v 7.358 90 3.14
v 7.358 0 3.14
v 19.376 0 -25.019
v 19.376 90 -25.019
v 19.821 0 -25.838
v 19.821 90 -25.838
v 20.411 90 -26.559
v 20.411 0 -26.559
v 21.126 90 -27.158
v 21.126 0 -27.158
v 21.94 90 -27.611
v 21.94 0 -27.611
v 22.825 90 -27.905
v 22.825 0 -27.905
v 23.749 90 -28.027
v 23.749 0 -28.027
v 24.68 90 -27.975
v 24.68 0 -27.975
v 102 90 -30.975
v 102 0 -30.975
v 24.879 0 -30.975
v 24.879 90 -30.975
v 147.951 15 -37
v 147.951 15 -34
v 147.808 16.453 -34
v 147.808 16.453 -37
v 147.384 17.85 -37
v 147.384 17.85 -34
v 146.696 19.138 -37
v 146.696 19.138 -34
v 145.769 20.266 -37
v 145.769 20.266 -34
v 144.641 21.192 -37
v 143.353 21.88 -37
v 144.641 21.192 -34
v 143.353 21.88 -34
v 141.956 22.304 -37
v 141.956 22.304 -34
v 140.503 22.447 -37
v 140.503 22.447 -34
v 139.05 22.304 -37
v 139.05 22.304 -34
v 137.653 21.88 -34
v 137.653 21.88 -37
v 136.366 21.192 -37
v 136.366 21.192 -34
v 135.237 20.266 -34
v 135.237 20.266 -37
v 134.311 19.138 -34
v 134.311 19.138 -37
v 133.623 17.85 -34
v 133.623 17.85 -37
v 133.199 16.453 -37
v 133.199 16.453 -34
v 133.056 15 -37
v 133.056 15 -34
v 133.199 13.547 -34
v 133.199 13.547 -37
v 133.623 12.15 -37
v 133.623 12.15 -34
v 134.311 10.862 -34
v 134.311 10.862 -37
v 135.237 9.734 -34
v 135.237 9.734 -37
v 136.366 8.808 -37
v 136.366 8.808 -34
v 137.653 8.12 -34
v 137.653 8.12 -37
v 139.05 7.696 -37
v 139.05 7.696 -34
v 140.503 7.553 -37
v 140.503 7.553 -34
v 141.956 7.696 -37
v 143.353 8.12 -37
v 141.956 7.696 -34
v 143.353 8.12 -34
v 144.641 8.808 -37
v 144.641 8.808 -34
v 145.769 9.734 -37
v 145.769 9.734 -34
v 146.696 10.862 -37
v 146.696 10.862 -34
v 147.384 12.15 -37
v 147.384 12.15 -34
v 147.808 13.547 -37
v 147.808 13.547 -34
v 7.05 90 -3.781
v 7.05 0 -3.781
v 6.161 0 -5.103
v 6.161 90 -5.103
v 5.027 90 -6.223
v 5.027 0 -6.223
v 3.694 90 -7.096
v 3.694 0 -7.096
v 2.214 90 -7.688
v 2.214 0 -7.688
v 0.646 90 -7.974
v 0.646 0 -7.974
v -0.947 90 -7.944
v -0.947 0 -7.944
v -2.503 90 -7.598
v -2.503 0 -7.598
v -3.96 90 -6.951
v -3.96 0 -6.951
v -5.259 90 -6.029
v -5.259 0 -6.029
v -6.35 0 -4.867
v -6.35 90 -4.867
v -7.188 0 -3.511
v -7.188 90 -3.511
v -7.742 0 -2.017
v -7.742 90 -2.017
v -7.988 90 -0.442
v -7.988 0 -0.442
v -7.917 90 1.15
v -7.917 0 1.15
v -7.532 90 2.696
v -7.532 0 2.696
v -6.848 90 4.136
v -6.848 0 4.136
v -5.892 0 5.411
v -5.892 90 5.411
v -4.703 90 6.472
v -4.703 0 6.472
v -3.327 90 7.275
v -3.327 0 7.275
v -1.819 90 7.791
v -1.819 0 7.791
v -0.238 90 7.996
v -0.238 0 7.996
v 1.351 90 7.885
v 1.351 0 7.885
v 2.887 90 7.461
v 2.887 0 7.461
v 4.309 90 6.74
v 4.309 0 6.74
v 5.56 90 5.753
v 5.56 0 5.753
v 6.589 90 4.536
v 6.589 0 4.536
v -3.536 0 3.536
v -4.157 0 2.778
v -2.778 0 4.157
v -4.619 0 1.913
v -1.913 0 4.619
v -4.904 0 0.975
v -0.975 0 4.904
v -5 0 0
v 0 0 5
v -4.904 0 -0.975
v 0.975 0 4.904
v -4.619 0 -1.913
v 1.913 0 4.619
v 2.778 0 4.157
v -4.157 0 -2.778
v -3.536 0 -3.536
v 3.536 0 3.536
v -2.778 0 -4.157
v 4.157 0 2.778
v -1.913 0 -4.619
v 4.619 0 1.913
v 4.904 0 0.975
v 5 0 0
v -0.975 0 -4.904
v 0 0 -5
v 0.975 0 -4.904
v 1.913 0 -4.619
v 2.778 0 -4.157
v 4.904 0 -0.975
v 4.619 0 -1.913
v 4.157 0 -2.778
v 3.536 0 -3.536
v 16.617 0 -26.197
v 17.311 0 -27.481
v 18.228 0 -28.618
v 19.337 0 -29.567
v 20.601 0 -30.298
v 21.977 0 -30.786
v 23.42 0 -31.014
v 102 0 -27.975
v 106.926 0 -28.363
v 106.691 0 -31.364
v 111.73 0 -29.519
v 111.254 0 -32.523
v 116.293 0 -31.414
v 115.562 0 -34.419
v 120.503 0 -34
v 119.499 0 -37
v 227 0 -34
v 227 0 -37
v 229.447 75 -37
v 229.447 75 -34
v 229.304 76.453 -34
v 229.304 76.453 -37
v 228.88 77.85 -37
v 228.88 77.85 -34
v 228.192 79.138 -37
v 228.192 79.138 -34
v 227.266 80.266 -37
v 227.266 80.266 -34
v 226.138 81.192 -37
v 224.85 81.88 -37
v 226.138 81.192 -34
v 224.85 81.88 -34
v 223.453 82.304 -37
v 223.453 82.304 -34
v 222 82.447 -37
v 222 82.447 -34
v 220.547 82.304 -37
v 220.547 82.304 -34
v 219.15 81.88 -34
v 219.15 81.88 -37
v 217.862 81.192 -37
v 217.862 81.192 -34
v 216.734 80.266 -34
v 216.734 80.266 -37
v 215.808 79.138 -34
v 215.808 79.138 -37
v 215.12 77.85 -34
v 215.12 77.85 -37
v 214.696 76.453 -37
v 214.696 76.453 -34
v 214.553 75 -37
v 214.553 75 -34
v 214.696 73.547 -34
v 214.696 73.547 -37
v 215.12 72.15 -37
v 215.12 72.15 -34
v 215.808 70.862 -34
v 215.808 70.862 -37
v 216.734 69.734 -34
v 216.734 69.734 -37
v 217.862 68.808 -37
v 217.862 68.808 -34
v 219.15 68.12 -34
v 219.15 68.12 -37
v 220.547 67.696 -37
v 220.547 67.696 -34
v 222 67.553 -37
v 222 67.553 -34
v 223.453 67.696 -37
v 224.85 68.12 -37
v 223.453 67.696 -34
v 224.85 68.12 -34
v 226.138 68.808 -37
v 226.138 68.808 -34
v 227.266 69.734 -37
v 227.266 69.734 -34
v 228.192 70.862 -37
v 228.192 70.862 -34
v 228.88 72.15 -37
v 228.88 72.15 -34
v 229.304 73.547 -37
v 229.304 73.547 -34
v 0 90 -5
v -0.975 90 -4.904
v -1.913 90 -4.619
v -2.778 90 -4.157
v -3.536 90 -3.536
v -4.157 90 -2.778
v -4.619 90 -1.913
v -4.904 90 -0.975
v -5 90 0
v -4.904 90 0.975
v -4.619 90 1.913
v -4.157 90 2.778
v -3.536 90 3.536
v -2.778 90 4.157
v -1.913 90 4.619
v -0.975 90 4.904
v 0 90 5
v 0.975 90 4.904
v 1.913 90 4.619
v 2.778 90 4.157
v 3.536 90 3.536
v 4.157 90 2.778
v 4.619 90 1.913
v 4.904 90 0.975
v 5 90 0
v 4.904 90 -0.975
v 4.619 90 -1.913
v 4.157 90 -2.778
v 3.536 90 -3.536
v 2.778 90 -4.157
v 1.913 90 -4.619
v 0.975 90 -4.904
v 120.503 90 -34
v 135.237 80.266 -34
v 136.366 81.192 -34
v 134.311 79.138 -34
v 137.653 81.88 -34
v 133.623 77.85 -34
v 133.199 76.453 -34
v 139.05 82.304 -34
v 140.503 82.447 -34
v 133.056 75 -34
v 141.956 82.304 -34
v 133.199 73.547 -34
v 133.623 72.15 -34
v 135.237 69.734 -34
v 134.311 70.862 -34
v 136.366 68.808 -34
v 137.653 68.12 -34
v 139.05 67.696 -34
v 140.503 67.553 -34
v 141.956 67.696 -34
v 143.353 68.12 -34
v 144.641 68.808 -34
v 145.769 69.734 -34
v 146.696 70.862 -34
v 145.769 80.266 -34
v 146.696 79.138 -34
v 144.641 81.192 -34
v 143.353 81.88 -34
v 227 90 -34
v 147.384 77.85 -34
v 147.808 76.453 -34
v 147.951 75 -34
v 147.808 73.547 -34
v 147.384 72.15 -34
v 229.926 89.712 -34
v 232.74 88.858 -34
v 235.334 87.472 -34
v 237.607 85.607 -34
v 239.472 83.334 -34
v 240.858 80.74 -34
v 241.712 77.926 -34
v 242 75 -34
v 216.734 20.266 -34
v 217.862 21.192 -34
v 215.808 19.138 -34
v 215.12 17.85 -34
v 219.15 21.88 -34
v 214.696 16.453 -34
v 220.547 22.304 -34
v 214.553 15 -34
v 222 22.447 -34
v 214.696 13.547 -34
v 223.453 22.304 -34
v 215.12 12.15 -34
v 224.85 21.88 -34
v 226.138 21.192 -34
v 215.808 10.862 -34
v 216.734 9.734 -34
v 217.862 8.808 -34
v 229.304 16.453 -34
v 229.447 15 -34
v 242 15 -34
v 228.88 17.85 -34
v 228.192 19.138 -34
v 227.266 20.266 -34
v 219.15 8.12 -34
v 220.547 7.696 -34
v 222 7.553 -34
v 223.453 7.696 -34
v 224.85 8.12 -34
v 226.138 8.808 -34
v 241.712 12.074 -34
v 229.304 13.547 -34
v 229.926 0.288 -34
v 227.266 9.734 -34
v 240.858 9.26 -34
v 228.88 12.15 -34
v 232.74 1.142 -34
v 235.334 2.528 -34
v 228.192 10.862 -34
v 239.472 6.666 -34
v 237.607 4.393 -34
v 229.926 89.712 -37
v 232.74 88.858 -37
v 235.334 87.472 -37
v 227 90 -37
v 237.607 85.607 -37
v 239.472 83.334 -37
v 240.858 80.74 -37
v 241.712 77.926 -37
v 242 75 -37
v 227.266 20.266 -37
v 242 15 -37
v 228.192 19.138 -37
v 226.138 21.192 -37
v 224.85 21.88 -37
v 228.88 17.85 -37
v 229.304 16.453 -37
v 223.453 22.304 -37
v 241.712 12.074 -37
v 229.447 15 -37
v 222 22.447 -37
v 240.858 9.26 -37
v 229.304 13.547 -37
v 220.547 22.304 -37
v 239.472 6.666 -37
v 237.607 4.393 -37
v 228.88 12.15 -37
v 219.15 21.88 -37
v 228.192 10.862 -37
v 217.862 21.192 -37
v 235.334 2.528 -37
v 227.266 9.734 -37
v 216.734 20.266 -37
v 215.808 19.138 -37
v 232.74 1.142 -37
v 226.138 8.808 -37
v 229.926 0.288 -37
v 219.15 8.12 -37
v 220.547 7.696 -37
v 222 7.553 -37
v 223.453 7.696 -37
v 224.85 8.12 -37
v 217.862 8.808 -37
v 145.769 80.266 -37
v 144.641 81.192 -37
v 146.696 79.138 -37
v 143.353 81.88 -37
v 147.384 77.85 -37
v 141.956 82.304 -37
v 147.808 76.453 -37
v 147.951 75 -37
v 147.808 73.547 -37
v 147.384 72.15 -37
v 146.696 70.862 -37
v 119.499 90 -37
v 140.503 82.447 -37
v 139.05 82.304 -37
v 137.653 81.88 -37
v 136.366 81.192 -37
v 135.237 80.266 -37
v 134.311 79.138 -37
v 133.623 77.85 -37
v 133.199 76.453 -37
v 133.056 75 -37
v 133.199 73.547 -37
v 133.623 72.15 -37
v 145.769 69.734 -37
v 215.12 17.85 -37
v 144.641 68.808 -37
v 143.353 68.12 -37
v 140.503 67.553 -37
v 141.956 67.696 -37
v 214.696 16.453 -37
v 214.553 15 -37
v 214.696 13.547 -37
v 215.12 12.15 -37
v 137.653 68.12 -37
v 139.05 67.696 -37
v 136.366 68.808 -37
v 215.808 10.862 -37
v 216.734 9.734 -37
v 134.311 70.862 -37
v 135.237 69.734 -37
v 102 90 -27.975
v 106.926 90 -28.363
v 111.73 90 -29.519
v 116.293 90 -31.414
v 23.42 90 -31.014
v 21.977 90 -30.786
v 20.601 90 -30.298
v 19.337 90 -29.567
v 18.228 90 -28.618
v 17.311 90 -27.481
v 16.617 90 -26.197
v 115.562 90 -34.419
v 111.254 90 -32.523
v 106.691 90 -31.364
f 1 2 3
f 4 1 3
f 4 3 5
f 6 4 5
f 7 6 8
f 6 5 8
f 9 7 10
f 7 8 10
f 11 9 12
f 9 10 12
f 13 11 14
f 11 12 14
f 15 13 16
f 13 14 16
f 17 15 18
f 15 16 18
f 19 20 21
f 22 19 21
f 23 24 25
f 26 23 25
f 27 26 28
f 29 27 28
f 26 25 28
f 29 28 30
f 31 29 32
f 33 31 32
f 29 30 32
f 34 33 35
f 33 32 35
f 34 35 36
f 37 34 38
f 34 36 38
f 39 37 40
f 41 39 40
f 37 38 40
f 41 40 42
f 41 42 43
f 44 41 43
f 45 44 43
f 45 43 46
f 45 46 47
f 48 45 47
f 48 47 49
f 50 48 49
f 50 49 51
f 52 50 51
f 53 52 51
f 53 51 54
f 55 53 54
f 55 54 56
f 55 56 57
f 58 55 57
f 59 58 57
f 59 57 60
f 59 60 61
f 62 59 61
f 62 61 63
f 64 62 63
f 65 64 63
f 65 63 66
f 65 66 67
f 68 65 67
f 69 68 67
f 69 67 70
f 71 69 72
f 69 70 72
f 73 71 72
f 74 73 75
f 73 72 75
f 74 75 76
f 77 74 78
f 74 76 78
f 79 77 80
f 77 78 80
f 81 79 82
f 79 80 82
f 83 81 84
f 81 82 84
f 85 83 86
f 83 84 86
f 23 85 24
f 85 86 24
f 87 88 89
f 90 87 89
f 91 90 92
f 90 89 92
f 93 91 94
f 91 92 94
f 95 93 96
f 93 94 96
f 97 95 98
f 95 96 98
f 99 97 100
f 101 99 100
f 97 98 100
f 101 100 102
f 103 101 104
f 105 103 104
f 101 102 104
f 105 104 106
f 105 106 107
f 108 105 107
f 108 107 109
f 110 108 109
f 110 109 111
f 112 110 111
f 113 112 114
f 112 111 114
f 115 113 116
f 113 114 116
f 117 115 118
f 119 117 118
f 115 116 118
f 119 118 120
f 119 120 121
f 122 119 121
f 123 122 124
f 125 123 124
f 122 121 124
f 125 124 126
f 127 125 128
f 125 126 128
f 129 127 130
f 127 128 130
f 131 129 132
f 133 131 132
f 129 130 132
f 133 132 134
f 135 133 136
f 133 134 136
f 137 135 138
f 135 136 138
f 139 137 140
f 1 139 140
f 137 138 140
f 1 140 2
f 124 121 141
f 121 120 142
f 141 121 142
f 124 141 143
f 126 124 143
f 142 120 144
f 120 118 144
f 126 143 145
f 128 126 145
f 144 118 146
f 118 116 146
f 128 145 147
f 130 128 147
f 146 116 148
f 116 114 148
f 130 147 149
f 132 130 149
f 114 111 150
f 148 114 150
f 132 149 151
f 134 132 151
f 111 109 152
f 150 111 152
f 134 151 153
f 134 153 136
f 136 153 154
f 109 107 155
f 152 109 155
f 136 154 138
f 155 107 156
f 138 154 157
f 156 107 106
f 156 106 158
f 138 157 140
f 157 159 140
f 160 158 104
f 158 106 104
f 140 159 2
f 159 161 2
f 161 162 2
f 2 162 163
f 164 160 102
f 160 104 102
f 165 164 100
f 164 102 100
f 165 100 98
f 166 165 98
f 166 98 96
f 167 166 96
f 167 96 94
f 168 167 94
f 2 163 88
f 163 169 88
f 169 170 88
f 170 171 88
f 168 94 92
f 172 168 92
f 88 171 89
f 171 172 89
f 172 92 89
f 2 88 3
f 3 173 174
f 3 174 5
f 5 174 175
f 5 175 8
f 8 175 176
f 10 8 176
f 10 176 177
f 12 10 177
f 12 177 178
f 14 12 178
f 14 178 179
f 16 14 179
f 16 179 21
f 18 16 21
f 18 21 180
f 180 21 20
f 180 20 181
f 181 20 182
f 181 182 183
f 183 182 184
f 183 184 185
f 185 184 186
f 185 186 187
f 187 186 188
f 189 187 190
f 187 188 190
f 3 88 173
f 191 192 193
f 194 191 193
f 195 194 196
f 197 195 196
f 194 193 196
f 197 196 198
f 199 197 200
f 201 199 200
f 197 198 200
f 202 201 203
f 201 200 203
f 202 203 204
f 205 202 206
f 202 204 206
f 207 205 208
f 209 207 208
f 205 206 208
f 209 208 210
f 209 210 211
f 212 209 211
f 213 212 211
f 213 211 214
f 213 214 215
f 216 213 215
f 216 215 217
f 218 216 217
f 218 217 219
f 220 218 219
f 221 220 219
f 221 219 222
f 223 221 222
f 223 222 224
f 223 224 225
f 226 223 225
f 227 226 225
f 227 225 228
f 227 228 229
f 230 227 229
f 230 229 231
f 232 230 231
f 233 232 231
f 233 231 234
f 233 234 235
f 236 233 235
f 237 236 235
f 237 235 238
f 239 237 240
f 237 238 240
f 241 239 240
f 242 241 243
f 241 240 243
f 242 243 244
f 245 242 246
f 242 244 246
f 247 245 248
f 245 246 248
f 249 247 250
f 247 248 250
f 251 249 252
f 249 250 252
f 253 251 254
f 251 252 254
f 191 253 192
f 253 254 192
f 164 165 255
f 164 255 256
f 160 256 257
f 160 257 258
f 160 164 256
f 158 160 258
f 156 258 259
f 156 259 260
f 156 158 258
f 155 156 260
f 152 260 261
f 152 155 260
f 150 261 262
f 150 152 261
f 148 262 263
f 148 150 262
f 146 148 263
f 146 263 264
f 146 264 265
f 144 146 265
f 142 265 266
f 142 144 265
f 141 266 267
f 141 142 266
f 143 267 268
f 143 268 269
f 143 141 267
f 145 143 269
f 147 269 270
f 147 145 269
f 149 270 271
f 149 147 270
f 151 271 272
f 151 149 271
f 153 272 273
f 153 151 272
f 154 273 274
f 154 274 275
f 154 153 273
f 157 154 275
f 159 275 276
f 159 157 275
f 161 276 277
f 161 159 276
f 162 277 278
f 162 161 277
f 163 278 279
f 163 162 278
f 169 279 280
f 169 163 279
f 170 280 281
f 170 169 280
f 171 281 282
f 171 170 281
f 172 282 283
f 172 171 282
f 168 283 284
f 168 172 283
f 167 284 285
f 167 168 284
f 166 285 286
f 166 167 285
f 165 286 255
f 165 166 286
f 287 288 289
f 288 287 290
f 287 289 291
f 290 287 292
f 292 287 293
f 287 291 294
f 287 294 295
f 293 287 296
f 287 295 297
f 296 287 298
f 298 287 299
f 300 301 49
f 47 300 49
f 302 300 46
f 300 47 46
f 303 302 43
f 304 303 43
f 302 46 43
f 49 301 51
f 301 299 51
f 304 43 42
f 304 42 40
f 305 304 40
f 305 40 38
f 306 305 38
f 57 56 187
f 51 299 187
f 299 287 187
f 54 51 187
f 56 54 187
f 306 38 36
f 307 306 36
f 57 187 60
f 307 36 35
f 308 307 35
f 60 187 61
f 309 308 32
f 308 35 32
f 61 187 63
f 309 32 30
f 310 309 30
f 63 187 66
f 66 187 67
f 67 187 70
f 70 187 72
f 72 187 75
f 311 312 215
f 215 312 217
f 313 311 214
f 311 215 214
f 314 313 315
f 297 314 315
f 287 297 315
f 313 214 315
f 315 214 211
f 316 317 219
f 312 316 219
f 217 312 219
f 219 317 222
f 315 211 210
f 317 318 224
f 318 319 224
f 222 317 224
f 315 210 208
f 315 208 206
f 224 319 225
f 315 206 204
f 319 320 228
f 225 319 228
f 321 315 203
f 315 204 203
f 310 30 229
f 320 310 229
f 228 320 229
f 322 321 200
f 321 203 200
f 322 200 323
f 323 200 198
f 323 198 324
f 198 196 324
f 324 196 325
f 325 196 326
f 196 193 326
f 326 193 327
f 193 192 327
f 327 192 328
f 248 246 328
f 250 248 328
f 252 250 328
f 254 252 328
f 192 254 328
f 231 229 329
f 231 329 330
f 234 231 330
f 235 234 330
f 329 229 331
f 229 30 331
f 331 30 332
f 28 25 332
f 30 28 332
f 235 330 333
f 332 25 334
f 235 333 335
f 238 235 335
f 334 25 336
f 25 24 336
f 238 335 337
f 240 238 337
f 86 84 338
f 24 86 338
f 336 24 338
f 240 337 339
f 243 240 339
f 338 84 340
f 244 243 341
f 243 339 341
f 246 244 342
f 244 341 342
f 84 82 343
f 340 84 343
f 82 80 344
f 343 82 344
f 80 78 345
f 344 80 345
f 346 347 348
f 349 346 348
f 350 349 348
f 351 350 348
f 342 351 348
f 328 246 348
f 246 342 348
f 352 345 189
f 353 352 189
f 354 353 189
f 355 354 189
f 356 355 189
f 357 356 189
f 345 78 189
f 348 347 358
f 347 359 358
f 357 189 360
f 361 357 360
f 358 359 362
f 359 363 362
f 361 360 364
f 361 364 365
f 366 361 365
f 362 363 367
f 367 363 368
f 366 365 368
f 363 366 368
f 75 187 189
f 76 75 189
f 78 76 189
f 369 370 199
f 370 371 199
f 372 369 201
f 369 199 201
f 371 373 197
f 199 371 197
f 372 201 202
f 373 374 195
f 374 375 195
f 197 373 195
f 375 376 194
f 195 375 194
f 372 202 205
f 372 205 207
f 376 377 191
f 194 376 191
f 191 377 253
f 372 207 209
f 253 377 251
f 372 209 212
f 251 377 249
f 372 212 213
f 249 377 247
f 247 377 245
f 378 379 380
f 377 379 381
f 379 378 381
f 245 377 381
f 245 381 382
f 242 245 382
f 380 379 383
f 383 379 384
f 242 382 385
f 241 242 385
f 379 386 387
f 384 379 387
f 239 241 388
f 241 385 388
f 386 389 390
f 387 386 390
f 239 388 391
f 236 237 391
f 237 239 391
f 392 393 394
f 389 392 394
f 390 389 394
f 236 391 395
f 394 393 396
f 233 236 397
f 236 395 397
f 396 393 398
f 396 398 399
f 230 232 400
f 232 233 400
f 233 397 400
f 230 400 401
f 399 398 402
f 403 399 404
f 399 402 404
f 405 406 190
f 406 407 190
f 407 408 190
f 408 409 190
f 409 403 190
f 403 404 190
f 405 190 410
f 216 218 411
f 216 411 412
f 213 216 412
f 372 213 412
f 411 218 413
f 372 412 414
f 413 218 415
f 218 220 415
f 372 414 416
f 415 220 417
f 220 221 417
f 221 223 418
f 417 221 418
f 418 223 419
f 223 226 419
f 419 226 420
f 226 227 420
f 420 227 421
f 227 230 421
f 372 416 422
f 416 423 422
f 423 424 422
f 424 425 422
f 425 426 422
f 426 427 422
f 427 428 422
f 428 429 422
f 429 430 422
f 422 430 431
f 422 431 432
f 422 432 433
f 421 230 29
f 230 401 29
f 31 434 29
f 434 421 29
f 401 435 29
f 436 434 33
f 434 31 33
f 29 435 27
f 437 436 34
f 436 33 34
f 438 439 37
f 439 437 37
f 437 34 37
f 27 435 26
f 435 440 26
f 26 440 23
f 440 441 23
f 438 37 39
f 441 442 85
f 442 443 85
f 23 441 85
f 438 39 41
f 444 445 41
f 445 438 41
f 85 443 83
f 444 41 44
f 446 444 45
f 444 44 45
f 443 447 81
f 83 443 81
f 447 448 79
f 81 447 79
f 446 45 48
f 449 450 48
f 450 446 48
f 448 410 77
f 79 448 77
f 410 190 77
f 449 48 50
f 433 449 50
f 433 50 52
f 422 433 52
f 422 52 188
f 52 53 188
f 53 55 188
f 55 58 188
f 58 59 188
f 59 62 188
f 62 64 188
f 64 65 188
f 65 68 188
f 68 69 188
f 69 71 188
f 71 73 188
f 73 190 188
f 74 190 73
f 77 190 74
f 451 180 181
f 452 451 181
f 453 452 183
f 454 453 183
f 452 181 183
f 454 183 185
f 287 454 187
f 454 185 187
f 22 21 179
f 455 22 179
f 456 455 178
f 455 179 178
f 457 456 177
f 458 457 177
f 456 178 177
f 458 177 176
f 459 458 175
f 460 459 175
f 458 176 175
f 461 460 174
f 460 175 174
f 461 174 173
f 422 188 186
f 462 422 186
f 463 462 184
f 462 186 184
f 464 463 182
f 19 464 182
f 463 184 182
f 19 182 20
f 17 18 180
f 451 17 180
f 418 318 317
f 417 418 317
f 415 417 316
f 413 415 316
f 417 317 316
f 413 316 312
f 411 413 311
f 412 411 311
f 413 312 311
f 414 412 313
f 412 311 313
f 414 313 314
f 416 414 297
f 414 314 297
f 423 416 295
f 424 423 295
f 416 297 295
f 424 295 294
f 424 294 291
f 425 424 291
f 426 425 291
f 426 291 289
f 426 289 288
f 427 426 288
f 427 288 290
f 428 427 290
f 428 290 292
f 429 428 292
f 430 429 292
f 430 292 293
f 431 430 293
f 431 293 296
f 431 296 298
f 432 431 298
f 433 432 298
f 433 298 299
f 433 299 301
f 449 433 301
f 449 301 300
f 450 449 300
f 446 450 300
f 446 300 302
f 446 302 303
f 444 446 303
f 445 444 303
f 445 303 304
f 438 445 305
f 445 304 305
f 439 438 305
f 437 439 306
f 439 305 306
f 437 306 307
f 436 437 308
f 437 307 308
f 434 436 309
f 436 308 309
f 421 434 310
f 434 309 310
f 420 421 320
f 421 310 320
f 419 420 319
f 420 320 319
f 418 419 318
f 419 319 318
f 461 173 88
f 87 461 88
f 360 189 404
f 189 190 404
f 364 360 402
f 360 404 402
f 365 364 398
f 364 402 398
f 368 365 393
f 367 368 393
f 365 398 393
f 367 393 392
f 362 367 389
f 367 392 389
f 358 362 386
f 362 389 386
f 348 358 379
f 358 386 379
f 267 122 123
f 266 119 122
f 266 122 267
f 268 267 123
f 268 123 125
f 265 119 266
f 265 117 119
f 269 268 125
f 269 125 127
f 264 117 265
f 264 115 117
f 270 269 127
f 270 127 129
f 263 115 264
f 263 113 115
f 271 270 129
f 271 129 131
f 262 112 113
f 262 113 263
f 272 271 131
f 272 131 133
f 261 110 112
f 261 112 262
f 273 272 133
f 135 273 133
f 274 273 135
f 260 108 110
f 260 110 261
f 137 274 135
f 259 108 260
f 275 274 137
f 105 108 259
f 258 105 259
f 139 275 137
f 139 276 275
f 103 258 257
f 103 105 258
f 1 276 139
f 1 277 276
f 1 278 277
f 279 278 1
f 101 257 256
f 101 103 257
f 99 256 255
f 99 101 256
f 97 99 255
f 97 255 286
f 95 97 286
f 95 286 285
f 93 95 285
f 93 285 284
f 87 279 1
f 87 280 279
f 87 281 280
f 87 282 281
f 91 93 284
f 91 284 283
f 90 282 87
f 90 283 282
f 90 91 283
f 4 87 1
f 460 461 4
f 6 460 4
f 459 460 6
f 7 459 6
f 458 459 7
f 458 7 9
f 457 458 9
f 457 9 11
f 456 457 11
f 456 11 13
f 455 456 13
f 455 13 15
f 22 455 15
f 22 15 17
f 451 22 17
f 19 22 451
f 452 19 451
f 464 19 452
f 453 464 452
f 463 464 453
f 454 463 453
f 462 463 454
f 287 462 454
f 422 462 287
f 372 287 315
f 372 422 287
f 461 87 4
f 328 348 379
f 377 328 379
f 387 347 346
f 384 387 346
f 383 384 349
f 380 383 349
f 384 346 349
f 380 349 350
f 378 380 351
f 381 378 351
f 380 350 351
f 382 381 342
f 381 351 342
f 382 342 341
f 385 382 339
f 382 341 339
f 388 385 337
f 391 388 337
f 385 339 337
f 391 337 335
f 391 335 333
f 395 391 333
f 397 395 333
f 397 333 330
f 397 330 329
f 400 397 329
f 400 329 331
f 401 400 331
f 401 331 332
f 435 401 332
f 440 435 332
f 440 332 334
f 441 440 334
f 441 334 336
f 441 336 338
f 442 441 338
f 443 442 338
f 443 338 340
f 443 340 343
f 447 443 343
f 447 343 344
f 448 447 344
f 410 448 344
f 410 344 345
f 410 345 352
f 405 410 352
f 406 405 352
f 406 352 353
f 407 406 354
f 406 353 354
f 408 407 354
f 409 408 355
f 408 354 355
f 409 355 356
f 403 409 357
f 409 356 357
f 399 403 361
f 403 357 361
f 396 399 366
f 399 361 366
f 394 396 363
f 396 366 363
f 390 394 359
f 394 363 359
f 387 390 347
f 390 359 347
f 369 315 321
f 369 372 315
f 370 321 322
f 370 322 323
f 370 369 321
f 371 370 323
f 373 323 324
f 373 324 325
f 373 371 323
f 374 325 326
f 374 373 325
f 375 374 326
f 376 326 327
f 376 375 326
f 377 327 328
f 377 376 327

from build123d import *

# Parameters (mm, degrees)
SKETCH7_R           = 5
BOSS_EXTRUDE1_DEPTH = 90
SKETCH8_R           = 7.447394551
CUT_EXTRUDE1_DEPTH  = 90
FILLET1_R           = 15


with BuildPart() as part:
    # Sketch7 → Boss-Extrude1 (new body)
    with BuildSketch(Plane(origin=(0, 0, 0), x_dir=(1, 0, 0), z_dir=(0, 1, 0))):
        with BuildLine():
            Line((7.357897338, -3.140278136), (19.375959063, 25.018904128))
            ThreePointArc((19.375959063, 25.018904128), (21.522528234, 27.403649264), (24.679857301, 27.974649904))
            Line((24.679857301, 27.974649904), (102, 27.974649904))
            ThreePointArc((102, 27.974649904), (111.729786481, 29.518933772), (120.503246637, 34))
            Line((120.503246637, 34), (242, 34))
            Line((242, 34), (242, 37))
            Line((242, 37), (119.499086706, 37))
            ThreePointArc((119.499086706, 37), (111.253686824, 32.523169315), (102, 30.974649904))
            Line((102, 30.974649904), (24.879394183, 30.974649904))
            ThreePointArc((24.879394183, 30.974649904), (19.95222913, 29.961796073), (16.616747562, 26.196508428))
            Line((16.616747562, 26.196508428), (7.05006467, 3.781082934))
            ThreePointArc((7.05006467, 3.781082934), (-7.992099353, -0.355454547), (7.357897338, -3.140278136))
        make_face()
        with Locations(Location((0, 0, 0), (0, 0, 90))):
            Circle(SKETCH7_R, mode=Mode.SUBTRACT)
    extrude(amount=BOSS_EXTRUDE1_DEPTH)

    # Sketch8 → Cut-Extrude1 (cut)
    with BuildSketch(Plane.XY.offset(-34)):
        with Locations((140.503246637, 75)):
            Circle(SKETCH8_R)
        with Locations((140.503246637, 15)):
            Circle(SKETCH8_R)
        with Locations((222, 75)):
            Circle(SKETCH8_R)
        with Locations((222, 15)):
            Circle(SKETCH8_R)
    extrude(amount=-CUT_EXTRUDE1_DEPTH, mode=Mode.SUBTRACT)

    # Fillet1
    fillet1_edges = [part.edges().sort_by_distance(p)[0] for p in [
        (242, 0, -35.5),
        (242, 90, -35.5),
    ]]
    fillet(fillet1_edges, radius=FILLET1_R)


solid = part.part
